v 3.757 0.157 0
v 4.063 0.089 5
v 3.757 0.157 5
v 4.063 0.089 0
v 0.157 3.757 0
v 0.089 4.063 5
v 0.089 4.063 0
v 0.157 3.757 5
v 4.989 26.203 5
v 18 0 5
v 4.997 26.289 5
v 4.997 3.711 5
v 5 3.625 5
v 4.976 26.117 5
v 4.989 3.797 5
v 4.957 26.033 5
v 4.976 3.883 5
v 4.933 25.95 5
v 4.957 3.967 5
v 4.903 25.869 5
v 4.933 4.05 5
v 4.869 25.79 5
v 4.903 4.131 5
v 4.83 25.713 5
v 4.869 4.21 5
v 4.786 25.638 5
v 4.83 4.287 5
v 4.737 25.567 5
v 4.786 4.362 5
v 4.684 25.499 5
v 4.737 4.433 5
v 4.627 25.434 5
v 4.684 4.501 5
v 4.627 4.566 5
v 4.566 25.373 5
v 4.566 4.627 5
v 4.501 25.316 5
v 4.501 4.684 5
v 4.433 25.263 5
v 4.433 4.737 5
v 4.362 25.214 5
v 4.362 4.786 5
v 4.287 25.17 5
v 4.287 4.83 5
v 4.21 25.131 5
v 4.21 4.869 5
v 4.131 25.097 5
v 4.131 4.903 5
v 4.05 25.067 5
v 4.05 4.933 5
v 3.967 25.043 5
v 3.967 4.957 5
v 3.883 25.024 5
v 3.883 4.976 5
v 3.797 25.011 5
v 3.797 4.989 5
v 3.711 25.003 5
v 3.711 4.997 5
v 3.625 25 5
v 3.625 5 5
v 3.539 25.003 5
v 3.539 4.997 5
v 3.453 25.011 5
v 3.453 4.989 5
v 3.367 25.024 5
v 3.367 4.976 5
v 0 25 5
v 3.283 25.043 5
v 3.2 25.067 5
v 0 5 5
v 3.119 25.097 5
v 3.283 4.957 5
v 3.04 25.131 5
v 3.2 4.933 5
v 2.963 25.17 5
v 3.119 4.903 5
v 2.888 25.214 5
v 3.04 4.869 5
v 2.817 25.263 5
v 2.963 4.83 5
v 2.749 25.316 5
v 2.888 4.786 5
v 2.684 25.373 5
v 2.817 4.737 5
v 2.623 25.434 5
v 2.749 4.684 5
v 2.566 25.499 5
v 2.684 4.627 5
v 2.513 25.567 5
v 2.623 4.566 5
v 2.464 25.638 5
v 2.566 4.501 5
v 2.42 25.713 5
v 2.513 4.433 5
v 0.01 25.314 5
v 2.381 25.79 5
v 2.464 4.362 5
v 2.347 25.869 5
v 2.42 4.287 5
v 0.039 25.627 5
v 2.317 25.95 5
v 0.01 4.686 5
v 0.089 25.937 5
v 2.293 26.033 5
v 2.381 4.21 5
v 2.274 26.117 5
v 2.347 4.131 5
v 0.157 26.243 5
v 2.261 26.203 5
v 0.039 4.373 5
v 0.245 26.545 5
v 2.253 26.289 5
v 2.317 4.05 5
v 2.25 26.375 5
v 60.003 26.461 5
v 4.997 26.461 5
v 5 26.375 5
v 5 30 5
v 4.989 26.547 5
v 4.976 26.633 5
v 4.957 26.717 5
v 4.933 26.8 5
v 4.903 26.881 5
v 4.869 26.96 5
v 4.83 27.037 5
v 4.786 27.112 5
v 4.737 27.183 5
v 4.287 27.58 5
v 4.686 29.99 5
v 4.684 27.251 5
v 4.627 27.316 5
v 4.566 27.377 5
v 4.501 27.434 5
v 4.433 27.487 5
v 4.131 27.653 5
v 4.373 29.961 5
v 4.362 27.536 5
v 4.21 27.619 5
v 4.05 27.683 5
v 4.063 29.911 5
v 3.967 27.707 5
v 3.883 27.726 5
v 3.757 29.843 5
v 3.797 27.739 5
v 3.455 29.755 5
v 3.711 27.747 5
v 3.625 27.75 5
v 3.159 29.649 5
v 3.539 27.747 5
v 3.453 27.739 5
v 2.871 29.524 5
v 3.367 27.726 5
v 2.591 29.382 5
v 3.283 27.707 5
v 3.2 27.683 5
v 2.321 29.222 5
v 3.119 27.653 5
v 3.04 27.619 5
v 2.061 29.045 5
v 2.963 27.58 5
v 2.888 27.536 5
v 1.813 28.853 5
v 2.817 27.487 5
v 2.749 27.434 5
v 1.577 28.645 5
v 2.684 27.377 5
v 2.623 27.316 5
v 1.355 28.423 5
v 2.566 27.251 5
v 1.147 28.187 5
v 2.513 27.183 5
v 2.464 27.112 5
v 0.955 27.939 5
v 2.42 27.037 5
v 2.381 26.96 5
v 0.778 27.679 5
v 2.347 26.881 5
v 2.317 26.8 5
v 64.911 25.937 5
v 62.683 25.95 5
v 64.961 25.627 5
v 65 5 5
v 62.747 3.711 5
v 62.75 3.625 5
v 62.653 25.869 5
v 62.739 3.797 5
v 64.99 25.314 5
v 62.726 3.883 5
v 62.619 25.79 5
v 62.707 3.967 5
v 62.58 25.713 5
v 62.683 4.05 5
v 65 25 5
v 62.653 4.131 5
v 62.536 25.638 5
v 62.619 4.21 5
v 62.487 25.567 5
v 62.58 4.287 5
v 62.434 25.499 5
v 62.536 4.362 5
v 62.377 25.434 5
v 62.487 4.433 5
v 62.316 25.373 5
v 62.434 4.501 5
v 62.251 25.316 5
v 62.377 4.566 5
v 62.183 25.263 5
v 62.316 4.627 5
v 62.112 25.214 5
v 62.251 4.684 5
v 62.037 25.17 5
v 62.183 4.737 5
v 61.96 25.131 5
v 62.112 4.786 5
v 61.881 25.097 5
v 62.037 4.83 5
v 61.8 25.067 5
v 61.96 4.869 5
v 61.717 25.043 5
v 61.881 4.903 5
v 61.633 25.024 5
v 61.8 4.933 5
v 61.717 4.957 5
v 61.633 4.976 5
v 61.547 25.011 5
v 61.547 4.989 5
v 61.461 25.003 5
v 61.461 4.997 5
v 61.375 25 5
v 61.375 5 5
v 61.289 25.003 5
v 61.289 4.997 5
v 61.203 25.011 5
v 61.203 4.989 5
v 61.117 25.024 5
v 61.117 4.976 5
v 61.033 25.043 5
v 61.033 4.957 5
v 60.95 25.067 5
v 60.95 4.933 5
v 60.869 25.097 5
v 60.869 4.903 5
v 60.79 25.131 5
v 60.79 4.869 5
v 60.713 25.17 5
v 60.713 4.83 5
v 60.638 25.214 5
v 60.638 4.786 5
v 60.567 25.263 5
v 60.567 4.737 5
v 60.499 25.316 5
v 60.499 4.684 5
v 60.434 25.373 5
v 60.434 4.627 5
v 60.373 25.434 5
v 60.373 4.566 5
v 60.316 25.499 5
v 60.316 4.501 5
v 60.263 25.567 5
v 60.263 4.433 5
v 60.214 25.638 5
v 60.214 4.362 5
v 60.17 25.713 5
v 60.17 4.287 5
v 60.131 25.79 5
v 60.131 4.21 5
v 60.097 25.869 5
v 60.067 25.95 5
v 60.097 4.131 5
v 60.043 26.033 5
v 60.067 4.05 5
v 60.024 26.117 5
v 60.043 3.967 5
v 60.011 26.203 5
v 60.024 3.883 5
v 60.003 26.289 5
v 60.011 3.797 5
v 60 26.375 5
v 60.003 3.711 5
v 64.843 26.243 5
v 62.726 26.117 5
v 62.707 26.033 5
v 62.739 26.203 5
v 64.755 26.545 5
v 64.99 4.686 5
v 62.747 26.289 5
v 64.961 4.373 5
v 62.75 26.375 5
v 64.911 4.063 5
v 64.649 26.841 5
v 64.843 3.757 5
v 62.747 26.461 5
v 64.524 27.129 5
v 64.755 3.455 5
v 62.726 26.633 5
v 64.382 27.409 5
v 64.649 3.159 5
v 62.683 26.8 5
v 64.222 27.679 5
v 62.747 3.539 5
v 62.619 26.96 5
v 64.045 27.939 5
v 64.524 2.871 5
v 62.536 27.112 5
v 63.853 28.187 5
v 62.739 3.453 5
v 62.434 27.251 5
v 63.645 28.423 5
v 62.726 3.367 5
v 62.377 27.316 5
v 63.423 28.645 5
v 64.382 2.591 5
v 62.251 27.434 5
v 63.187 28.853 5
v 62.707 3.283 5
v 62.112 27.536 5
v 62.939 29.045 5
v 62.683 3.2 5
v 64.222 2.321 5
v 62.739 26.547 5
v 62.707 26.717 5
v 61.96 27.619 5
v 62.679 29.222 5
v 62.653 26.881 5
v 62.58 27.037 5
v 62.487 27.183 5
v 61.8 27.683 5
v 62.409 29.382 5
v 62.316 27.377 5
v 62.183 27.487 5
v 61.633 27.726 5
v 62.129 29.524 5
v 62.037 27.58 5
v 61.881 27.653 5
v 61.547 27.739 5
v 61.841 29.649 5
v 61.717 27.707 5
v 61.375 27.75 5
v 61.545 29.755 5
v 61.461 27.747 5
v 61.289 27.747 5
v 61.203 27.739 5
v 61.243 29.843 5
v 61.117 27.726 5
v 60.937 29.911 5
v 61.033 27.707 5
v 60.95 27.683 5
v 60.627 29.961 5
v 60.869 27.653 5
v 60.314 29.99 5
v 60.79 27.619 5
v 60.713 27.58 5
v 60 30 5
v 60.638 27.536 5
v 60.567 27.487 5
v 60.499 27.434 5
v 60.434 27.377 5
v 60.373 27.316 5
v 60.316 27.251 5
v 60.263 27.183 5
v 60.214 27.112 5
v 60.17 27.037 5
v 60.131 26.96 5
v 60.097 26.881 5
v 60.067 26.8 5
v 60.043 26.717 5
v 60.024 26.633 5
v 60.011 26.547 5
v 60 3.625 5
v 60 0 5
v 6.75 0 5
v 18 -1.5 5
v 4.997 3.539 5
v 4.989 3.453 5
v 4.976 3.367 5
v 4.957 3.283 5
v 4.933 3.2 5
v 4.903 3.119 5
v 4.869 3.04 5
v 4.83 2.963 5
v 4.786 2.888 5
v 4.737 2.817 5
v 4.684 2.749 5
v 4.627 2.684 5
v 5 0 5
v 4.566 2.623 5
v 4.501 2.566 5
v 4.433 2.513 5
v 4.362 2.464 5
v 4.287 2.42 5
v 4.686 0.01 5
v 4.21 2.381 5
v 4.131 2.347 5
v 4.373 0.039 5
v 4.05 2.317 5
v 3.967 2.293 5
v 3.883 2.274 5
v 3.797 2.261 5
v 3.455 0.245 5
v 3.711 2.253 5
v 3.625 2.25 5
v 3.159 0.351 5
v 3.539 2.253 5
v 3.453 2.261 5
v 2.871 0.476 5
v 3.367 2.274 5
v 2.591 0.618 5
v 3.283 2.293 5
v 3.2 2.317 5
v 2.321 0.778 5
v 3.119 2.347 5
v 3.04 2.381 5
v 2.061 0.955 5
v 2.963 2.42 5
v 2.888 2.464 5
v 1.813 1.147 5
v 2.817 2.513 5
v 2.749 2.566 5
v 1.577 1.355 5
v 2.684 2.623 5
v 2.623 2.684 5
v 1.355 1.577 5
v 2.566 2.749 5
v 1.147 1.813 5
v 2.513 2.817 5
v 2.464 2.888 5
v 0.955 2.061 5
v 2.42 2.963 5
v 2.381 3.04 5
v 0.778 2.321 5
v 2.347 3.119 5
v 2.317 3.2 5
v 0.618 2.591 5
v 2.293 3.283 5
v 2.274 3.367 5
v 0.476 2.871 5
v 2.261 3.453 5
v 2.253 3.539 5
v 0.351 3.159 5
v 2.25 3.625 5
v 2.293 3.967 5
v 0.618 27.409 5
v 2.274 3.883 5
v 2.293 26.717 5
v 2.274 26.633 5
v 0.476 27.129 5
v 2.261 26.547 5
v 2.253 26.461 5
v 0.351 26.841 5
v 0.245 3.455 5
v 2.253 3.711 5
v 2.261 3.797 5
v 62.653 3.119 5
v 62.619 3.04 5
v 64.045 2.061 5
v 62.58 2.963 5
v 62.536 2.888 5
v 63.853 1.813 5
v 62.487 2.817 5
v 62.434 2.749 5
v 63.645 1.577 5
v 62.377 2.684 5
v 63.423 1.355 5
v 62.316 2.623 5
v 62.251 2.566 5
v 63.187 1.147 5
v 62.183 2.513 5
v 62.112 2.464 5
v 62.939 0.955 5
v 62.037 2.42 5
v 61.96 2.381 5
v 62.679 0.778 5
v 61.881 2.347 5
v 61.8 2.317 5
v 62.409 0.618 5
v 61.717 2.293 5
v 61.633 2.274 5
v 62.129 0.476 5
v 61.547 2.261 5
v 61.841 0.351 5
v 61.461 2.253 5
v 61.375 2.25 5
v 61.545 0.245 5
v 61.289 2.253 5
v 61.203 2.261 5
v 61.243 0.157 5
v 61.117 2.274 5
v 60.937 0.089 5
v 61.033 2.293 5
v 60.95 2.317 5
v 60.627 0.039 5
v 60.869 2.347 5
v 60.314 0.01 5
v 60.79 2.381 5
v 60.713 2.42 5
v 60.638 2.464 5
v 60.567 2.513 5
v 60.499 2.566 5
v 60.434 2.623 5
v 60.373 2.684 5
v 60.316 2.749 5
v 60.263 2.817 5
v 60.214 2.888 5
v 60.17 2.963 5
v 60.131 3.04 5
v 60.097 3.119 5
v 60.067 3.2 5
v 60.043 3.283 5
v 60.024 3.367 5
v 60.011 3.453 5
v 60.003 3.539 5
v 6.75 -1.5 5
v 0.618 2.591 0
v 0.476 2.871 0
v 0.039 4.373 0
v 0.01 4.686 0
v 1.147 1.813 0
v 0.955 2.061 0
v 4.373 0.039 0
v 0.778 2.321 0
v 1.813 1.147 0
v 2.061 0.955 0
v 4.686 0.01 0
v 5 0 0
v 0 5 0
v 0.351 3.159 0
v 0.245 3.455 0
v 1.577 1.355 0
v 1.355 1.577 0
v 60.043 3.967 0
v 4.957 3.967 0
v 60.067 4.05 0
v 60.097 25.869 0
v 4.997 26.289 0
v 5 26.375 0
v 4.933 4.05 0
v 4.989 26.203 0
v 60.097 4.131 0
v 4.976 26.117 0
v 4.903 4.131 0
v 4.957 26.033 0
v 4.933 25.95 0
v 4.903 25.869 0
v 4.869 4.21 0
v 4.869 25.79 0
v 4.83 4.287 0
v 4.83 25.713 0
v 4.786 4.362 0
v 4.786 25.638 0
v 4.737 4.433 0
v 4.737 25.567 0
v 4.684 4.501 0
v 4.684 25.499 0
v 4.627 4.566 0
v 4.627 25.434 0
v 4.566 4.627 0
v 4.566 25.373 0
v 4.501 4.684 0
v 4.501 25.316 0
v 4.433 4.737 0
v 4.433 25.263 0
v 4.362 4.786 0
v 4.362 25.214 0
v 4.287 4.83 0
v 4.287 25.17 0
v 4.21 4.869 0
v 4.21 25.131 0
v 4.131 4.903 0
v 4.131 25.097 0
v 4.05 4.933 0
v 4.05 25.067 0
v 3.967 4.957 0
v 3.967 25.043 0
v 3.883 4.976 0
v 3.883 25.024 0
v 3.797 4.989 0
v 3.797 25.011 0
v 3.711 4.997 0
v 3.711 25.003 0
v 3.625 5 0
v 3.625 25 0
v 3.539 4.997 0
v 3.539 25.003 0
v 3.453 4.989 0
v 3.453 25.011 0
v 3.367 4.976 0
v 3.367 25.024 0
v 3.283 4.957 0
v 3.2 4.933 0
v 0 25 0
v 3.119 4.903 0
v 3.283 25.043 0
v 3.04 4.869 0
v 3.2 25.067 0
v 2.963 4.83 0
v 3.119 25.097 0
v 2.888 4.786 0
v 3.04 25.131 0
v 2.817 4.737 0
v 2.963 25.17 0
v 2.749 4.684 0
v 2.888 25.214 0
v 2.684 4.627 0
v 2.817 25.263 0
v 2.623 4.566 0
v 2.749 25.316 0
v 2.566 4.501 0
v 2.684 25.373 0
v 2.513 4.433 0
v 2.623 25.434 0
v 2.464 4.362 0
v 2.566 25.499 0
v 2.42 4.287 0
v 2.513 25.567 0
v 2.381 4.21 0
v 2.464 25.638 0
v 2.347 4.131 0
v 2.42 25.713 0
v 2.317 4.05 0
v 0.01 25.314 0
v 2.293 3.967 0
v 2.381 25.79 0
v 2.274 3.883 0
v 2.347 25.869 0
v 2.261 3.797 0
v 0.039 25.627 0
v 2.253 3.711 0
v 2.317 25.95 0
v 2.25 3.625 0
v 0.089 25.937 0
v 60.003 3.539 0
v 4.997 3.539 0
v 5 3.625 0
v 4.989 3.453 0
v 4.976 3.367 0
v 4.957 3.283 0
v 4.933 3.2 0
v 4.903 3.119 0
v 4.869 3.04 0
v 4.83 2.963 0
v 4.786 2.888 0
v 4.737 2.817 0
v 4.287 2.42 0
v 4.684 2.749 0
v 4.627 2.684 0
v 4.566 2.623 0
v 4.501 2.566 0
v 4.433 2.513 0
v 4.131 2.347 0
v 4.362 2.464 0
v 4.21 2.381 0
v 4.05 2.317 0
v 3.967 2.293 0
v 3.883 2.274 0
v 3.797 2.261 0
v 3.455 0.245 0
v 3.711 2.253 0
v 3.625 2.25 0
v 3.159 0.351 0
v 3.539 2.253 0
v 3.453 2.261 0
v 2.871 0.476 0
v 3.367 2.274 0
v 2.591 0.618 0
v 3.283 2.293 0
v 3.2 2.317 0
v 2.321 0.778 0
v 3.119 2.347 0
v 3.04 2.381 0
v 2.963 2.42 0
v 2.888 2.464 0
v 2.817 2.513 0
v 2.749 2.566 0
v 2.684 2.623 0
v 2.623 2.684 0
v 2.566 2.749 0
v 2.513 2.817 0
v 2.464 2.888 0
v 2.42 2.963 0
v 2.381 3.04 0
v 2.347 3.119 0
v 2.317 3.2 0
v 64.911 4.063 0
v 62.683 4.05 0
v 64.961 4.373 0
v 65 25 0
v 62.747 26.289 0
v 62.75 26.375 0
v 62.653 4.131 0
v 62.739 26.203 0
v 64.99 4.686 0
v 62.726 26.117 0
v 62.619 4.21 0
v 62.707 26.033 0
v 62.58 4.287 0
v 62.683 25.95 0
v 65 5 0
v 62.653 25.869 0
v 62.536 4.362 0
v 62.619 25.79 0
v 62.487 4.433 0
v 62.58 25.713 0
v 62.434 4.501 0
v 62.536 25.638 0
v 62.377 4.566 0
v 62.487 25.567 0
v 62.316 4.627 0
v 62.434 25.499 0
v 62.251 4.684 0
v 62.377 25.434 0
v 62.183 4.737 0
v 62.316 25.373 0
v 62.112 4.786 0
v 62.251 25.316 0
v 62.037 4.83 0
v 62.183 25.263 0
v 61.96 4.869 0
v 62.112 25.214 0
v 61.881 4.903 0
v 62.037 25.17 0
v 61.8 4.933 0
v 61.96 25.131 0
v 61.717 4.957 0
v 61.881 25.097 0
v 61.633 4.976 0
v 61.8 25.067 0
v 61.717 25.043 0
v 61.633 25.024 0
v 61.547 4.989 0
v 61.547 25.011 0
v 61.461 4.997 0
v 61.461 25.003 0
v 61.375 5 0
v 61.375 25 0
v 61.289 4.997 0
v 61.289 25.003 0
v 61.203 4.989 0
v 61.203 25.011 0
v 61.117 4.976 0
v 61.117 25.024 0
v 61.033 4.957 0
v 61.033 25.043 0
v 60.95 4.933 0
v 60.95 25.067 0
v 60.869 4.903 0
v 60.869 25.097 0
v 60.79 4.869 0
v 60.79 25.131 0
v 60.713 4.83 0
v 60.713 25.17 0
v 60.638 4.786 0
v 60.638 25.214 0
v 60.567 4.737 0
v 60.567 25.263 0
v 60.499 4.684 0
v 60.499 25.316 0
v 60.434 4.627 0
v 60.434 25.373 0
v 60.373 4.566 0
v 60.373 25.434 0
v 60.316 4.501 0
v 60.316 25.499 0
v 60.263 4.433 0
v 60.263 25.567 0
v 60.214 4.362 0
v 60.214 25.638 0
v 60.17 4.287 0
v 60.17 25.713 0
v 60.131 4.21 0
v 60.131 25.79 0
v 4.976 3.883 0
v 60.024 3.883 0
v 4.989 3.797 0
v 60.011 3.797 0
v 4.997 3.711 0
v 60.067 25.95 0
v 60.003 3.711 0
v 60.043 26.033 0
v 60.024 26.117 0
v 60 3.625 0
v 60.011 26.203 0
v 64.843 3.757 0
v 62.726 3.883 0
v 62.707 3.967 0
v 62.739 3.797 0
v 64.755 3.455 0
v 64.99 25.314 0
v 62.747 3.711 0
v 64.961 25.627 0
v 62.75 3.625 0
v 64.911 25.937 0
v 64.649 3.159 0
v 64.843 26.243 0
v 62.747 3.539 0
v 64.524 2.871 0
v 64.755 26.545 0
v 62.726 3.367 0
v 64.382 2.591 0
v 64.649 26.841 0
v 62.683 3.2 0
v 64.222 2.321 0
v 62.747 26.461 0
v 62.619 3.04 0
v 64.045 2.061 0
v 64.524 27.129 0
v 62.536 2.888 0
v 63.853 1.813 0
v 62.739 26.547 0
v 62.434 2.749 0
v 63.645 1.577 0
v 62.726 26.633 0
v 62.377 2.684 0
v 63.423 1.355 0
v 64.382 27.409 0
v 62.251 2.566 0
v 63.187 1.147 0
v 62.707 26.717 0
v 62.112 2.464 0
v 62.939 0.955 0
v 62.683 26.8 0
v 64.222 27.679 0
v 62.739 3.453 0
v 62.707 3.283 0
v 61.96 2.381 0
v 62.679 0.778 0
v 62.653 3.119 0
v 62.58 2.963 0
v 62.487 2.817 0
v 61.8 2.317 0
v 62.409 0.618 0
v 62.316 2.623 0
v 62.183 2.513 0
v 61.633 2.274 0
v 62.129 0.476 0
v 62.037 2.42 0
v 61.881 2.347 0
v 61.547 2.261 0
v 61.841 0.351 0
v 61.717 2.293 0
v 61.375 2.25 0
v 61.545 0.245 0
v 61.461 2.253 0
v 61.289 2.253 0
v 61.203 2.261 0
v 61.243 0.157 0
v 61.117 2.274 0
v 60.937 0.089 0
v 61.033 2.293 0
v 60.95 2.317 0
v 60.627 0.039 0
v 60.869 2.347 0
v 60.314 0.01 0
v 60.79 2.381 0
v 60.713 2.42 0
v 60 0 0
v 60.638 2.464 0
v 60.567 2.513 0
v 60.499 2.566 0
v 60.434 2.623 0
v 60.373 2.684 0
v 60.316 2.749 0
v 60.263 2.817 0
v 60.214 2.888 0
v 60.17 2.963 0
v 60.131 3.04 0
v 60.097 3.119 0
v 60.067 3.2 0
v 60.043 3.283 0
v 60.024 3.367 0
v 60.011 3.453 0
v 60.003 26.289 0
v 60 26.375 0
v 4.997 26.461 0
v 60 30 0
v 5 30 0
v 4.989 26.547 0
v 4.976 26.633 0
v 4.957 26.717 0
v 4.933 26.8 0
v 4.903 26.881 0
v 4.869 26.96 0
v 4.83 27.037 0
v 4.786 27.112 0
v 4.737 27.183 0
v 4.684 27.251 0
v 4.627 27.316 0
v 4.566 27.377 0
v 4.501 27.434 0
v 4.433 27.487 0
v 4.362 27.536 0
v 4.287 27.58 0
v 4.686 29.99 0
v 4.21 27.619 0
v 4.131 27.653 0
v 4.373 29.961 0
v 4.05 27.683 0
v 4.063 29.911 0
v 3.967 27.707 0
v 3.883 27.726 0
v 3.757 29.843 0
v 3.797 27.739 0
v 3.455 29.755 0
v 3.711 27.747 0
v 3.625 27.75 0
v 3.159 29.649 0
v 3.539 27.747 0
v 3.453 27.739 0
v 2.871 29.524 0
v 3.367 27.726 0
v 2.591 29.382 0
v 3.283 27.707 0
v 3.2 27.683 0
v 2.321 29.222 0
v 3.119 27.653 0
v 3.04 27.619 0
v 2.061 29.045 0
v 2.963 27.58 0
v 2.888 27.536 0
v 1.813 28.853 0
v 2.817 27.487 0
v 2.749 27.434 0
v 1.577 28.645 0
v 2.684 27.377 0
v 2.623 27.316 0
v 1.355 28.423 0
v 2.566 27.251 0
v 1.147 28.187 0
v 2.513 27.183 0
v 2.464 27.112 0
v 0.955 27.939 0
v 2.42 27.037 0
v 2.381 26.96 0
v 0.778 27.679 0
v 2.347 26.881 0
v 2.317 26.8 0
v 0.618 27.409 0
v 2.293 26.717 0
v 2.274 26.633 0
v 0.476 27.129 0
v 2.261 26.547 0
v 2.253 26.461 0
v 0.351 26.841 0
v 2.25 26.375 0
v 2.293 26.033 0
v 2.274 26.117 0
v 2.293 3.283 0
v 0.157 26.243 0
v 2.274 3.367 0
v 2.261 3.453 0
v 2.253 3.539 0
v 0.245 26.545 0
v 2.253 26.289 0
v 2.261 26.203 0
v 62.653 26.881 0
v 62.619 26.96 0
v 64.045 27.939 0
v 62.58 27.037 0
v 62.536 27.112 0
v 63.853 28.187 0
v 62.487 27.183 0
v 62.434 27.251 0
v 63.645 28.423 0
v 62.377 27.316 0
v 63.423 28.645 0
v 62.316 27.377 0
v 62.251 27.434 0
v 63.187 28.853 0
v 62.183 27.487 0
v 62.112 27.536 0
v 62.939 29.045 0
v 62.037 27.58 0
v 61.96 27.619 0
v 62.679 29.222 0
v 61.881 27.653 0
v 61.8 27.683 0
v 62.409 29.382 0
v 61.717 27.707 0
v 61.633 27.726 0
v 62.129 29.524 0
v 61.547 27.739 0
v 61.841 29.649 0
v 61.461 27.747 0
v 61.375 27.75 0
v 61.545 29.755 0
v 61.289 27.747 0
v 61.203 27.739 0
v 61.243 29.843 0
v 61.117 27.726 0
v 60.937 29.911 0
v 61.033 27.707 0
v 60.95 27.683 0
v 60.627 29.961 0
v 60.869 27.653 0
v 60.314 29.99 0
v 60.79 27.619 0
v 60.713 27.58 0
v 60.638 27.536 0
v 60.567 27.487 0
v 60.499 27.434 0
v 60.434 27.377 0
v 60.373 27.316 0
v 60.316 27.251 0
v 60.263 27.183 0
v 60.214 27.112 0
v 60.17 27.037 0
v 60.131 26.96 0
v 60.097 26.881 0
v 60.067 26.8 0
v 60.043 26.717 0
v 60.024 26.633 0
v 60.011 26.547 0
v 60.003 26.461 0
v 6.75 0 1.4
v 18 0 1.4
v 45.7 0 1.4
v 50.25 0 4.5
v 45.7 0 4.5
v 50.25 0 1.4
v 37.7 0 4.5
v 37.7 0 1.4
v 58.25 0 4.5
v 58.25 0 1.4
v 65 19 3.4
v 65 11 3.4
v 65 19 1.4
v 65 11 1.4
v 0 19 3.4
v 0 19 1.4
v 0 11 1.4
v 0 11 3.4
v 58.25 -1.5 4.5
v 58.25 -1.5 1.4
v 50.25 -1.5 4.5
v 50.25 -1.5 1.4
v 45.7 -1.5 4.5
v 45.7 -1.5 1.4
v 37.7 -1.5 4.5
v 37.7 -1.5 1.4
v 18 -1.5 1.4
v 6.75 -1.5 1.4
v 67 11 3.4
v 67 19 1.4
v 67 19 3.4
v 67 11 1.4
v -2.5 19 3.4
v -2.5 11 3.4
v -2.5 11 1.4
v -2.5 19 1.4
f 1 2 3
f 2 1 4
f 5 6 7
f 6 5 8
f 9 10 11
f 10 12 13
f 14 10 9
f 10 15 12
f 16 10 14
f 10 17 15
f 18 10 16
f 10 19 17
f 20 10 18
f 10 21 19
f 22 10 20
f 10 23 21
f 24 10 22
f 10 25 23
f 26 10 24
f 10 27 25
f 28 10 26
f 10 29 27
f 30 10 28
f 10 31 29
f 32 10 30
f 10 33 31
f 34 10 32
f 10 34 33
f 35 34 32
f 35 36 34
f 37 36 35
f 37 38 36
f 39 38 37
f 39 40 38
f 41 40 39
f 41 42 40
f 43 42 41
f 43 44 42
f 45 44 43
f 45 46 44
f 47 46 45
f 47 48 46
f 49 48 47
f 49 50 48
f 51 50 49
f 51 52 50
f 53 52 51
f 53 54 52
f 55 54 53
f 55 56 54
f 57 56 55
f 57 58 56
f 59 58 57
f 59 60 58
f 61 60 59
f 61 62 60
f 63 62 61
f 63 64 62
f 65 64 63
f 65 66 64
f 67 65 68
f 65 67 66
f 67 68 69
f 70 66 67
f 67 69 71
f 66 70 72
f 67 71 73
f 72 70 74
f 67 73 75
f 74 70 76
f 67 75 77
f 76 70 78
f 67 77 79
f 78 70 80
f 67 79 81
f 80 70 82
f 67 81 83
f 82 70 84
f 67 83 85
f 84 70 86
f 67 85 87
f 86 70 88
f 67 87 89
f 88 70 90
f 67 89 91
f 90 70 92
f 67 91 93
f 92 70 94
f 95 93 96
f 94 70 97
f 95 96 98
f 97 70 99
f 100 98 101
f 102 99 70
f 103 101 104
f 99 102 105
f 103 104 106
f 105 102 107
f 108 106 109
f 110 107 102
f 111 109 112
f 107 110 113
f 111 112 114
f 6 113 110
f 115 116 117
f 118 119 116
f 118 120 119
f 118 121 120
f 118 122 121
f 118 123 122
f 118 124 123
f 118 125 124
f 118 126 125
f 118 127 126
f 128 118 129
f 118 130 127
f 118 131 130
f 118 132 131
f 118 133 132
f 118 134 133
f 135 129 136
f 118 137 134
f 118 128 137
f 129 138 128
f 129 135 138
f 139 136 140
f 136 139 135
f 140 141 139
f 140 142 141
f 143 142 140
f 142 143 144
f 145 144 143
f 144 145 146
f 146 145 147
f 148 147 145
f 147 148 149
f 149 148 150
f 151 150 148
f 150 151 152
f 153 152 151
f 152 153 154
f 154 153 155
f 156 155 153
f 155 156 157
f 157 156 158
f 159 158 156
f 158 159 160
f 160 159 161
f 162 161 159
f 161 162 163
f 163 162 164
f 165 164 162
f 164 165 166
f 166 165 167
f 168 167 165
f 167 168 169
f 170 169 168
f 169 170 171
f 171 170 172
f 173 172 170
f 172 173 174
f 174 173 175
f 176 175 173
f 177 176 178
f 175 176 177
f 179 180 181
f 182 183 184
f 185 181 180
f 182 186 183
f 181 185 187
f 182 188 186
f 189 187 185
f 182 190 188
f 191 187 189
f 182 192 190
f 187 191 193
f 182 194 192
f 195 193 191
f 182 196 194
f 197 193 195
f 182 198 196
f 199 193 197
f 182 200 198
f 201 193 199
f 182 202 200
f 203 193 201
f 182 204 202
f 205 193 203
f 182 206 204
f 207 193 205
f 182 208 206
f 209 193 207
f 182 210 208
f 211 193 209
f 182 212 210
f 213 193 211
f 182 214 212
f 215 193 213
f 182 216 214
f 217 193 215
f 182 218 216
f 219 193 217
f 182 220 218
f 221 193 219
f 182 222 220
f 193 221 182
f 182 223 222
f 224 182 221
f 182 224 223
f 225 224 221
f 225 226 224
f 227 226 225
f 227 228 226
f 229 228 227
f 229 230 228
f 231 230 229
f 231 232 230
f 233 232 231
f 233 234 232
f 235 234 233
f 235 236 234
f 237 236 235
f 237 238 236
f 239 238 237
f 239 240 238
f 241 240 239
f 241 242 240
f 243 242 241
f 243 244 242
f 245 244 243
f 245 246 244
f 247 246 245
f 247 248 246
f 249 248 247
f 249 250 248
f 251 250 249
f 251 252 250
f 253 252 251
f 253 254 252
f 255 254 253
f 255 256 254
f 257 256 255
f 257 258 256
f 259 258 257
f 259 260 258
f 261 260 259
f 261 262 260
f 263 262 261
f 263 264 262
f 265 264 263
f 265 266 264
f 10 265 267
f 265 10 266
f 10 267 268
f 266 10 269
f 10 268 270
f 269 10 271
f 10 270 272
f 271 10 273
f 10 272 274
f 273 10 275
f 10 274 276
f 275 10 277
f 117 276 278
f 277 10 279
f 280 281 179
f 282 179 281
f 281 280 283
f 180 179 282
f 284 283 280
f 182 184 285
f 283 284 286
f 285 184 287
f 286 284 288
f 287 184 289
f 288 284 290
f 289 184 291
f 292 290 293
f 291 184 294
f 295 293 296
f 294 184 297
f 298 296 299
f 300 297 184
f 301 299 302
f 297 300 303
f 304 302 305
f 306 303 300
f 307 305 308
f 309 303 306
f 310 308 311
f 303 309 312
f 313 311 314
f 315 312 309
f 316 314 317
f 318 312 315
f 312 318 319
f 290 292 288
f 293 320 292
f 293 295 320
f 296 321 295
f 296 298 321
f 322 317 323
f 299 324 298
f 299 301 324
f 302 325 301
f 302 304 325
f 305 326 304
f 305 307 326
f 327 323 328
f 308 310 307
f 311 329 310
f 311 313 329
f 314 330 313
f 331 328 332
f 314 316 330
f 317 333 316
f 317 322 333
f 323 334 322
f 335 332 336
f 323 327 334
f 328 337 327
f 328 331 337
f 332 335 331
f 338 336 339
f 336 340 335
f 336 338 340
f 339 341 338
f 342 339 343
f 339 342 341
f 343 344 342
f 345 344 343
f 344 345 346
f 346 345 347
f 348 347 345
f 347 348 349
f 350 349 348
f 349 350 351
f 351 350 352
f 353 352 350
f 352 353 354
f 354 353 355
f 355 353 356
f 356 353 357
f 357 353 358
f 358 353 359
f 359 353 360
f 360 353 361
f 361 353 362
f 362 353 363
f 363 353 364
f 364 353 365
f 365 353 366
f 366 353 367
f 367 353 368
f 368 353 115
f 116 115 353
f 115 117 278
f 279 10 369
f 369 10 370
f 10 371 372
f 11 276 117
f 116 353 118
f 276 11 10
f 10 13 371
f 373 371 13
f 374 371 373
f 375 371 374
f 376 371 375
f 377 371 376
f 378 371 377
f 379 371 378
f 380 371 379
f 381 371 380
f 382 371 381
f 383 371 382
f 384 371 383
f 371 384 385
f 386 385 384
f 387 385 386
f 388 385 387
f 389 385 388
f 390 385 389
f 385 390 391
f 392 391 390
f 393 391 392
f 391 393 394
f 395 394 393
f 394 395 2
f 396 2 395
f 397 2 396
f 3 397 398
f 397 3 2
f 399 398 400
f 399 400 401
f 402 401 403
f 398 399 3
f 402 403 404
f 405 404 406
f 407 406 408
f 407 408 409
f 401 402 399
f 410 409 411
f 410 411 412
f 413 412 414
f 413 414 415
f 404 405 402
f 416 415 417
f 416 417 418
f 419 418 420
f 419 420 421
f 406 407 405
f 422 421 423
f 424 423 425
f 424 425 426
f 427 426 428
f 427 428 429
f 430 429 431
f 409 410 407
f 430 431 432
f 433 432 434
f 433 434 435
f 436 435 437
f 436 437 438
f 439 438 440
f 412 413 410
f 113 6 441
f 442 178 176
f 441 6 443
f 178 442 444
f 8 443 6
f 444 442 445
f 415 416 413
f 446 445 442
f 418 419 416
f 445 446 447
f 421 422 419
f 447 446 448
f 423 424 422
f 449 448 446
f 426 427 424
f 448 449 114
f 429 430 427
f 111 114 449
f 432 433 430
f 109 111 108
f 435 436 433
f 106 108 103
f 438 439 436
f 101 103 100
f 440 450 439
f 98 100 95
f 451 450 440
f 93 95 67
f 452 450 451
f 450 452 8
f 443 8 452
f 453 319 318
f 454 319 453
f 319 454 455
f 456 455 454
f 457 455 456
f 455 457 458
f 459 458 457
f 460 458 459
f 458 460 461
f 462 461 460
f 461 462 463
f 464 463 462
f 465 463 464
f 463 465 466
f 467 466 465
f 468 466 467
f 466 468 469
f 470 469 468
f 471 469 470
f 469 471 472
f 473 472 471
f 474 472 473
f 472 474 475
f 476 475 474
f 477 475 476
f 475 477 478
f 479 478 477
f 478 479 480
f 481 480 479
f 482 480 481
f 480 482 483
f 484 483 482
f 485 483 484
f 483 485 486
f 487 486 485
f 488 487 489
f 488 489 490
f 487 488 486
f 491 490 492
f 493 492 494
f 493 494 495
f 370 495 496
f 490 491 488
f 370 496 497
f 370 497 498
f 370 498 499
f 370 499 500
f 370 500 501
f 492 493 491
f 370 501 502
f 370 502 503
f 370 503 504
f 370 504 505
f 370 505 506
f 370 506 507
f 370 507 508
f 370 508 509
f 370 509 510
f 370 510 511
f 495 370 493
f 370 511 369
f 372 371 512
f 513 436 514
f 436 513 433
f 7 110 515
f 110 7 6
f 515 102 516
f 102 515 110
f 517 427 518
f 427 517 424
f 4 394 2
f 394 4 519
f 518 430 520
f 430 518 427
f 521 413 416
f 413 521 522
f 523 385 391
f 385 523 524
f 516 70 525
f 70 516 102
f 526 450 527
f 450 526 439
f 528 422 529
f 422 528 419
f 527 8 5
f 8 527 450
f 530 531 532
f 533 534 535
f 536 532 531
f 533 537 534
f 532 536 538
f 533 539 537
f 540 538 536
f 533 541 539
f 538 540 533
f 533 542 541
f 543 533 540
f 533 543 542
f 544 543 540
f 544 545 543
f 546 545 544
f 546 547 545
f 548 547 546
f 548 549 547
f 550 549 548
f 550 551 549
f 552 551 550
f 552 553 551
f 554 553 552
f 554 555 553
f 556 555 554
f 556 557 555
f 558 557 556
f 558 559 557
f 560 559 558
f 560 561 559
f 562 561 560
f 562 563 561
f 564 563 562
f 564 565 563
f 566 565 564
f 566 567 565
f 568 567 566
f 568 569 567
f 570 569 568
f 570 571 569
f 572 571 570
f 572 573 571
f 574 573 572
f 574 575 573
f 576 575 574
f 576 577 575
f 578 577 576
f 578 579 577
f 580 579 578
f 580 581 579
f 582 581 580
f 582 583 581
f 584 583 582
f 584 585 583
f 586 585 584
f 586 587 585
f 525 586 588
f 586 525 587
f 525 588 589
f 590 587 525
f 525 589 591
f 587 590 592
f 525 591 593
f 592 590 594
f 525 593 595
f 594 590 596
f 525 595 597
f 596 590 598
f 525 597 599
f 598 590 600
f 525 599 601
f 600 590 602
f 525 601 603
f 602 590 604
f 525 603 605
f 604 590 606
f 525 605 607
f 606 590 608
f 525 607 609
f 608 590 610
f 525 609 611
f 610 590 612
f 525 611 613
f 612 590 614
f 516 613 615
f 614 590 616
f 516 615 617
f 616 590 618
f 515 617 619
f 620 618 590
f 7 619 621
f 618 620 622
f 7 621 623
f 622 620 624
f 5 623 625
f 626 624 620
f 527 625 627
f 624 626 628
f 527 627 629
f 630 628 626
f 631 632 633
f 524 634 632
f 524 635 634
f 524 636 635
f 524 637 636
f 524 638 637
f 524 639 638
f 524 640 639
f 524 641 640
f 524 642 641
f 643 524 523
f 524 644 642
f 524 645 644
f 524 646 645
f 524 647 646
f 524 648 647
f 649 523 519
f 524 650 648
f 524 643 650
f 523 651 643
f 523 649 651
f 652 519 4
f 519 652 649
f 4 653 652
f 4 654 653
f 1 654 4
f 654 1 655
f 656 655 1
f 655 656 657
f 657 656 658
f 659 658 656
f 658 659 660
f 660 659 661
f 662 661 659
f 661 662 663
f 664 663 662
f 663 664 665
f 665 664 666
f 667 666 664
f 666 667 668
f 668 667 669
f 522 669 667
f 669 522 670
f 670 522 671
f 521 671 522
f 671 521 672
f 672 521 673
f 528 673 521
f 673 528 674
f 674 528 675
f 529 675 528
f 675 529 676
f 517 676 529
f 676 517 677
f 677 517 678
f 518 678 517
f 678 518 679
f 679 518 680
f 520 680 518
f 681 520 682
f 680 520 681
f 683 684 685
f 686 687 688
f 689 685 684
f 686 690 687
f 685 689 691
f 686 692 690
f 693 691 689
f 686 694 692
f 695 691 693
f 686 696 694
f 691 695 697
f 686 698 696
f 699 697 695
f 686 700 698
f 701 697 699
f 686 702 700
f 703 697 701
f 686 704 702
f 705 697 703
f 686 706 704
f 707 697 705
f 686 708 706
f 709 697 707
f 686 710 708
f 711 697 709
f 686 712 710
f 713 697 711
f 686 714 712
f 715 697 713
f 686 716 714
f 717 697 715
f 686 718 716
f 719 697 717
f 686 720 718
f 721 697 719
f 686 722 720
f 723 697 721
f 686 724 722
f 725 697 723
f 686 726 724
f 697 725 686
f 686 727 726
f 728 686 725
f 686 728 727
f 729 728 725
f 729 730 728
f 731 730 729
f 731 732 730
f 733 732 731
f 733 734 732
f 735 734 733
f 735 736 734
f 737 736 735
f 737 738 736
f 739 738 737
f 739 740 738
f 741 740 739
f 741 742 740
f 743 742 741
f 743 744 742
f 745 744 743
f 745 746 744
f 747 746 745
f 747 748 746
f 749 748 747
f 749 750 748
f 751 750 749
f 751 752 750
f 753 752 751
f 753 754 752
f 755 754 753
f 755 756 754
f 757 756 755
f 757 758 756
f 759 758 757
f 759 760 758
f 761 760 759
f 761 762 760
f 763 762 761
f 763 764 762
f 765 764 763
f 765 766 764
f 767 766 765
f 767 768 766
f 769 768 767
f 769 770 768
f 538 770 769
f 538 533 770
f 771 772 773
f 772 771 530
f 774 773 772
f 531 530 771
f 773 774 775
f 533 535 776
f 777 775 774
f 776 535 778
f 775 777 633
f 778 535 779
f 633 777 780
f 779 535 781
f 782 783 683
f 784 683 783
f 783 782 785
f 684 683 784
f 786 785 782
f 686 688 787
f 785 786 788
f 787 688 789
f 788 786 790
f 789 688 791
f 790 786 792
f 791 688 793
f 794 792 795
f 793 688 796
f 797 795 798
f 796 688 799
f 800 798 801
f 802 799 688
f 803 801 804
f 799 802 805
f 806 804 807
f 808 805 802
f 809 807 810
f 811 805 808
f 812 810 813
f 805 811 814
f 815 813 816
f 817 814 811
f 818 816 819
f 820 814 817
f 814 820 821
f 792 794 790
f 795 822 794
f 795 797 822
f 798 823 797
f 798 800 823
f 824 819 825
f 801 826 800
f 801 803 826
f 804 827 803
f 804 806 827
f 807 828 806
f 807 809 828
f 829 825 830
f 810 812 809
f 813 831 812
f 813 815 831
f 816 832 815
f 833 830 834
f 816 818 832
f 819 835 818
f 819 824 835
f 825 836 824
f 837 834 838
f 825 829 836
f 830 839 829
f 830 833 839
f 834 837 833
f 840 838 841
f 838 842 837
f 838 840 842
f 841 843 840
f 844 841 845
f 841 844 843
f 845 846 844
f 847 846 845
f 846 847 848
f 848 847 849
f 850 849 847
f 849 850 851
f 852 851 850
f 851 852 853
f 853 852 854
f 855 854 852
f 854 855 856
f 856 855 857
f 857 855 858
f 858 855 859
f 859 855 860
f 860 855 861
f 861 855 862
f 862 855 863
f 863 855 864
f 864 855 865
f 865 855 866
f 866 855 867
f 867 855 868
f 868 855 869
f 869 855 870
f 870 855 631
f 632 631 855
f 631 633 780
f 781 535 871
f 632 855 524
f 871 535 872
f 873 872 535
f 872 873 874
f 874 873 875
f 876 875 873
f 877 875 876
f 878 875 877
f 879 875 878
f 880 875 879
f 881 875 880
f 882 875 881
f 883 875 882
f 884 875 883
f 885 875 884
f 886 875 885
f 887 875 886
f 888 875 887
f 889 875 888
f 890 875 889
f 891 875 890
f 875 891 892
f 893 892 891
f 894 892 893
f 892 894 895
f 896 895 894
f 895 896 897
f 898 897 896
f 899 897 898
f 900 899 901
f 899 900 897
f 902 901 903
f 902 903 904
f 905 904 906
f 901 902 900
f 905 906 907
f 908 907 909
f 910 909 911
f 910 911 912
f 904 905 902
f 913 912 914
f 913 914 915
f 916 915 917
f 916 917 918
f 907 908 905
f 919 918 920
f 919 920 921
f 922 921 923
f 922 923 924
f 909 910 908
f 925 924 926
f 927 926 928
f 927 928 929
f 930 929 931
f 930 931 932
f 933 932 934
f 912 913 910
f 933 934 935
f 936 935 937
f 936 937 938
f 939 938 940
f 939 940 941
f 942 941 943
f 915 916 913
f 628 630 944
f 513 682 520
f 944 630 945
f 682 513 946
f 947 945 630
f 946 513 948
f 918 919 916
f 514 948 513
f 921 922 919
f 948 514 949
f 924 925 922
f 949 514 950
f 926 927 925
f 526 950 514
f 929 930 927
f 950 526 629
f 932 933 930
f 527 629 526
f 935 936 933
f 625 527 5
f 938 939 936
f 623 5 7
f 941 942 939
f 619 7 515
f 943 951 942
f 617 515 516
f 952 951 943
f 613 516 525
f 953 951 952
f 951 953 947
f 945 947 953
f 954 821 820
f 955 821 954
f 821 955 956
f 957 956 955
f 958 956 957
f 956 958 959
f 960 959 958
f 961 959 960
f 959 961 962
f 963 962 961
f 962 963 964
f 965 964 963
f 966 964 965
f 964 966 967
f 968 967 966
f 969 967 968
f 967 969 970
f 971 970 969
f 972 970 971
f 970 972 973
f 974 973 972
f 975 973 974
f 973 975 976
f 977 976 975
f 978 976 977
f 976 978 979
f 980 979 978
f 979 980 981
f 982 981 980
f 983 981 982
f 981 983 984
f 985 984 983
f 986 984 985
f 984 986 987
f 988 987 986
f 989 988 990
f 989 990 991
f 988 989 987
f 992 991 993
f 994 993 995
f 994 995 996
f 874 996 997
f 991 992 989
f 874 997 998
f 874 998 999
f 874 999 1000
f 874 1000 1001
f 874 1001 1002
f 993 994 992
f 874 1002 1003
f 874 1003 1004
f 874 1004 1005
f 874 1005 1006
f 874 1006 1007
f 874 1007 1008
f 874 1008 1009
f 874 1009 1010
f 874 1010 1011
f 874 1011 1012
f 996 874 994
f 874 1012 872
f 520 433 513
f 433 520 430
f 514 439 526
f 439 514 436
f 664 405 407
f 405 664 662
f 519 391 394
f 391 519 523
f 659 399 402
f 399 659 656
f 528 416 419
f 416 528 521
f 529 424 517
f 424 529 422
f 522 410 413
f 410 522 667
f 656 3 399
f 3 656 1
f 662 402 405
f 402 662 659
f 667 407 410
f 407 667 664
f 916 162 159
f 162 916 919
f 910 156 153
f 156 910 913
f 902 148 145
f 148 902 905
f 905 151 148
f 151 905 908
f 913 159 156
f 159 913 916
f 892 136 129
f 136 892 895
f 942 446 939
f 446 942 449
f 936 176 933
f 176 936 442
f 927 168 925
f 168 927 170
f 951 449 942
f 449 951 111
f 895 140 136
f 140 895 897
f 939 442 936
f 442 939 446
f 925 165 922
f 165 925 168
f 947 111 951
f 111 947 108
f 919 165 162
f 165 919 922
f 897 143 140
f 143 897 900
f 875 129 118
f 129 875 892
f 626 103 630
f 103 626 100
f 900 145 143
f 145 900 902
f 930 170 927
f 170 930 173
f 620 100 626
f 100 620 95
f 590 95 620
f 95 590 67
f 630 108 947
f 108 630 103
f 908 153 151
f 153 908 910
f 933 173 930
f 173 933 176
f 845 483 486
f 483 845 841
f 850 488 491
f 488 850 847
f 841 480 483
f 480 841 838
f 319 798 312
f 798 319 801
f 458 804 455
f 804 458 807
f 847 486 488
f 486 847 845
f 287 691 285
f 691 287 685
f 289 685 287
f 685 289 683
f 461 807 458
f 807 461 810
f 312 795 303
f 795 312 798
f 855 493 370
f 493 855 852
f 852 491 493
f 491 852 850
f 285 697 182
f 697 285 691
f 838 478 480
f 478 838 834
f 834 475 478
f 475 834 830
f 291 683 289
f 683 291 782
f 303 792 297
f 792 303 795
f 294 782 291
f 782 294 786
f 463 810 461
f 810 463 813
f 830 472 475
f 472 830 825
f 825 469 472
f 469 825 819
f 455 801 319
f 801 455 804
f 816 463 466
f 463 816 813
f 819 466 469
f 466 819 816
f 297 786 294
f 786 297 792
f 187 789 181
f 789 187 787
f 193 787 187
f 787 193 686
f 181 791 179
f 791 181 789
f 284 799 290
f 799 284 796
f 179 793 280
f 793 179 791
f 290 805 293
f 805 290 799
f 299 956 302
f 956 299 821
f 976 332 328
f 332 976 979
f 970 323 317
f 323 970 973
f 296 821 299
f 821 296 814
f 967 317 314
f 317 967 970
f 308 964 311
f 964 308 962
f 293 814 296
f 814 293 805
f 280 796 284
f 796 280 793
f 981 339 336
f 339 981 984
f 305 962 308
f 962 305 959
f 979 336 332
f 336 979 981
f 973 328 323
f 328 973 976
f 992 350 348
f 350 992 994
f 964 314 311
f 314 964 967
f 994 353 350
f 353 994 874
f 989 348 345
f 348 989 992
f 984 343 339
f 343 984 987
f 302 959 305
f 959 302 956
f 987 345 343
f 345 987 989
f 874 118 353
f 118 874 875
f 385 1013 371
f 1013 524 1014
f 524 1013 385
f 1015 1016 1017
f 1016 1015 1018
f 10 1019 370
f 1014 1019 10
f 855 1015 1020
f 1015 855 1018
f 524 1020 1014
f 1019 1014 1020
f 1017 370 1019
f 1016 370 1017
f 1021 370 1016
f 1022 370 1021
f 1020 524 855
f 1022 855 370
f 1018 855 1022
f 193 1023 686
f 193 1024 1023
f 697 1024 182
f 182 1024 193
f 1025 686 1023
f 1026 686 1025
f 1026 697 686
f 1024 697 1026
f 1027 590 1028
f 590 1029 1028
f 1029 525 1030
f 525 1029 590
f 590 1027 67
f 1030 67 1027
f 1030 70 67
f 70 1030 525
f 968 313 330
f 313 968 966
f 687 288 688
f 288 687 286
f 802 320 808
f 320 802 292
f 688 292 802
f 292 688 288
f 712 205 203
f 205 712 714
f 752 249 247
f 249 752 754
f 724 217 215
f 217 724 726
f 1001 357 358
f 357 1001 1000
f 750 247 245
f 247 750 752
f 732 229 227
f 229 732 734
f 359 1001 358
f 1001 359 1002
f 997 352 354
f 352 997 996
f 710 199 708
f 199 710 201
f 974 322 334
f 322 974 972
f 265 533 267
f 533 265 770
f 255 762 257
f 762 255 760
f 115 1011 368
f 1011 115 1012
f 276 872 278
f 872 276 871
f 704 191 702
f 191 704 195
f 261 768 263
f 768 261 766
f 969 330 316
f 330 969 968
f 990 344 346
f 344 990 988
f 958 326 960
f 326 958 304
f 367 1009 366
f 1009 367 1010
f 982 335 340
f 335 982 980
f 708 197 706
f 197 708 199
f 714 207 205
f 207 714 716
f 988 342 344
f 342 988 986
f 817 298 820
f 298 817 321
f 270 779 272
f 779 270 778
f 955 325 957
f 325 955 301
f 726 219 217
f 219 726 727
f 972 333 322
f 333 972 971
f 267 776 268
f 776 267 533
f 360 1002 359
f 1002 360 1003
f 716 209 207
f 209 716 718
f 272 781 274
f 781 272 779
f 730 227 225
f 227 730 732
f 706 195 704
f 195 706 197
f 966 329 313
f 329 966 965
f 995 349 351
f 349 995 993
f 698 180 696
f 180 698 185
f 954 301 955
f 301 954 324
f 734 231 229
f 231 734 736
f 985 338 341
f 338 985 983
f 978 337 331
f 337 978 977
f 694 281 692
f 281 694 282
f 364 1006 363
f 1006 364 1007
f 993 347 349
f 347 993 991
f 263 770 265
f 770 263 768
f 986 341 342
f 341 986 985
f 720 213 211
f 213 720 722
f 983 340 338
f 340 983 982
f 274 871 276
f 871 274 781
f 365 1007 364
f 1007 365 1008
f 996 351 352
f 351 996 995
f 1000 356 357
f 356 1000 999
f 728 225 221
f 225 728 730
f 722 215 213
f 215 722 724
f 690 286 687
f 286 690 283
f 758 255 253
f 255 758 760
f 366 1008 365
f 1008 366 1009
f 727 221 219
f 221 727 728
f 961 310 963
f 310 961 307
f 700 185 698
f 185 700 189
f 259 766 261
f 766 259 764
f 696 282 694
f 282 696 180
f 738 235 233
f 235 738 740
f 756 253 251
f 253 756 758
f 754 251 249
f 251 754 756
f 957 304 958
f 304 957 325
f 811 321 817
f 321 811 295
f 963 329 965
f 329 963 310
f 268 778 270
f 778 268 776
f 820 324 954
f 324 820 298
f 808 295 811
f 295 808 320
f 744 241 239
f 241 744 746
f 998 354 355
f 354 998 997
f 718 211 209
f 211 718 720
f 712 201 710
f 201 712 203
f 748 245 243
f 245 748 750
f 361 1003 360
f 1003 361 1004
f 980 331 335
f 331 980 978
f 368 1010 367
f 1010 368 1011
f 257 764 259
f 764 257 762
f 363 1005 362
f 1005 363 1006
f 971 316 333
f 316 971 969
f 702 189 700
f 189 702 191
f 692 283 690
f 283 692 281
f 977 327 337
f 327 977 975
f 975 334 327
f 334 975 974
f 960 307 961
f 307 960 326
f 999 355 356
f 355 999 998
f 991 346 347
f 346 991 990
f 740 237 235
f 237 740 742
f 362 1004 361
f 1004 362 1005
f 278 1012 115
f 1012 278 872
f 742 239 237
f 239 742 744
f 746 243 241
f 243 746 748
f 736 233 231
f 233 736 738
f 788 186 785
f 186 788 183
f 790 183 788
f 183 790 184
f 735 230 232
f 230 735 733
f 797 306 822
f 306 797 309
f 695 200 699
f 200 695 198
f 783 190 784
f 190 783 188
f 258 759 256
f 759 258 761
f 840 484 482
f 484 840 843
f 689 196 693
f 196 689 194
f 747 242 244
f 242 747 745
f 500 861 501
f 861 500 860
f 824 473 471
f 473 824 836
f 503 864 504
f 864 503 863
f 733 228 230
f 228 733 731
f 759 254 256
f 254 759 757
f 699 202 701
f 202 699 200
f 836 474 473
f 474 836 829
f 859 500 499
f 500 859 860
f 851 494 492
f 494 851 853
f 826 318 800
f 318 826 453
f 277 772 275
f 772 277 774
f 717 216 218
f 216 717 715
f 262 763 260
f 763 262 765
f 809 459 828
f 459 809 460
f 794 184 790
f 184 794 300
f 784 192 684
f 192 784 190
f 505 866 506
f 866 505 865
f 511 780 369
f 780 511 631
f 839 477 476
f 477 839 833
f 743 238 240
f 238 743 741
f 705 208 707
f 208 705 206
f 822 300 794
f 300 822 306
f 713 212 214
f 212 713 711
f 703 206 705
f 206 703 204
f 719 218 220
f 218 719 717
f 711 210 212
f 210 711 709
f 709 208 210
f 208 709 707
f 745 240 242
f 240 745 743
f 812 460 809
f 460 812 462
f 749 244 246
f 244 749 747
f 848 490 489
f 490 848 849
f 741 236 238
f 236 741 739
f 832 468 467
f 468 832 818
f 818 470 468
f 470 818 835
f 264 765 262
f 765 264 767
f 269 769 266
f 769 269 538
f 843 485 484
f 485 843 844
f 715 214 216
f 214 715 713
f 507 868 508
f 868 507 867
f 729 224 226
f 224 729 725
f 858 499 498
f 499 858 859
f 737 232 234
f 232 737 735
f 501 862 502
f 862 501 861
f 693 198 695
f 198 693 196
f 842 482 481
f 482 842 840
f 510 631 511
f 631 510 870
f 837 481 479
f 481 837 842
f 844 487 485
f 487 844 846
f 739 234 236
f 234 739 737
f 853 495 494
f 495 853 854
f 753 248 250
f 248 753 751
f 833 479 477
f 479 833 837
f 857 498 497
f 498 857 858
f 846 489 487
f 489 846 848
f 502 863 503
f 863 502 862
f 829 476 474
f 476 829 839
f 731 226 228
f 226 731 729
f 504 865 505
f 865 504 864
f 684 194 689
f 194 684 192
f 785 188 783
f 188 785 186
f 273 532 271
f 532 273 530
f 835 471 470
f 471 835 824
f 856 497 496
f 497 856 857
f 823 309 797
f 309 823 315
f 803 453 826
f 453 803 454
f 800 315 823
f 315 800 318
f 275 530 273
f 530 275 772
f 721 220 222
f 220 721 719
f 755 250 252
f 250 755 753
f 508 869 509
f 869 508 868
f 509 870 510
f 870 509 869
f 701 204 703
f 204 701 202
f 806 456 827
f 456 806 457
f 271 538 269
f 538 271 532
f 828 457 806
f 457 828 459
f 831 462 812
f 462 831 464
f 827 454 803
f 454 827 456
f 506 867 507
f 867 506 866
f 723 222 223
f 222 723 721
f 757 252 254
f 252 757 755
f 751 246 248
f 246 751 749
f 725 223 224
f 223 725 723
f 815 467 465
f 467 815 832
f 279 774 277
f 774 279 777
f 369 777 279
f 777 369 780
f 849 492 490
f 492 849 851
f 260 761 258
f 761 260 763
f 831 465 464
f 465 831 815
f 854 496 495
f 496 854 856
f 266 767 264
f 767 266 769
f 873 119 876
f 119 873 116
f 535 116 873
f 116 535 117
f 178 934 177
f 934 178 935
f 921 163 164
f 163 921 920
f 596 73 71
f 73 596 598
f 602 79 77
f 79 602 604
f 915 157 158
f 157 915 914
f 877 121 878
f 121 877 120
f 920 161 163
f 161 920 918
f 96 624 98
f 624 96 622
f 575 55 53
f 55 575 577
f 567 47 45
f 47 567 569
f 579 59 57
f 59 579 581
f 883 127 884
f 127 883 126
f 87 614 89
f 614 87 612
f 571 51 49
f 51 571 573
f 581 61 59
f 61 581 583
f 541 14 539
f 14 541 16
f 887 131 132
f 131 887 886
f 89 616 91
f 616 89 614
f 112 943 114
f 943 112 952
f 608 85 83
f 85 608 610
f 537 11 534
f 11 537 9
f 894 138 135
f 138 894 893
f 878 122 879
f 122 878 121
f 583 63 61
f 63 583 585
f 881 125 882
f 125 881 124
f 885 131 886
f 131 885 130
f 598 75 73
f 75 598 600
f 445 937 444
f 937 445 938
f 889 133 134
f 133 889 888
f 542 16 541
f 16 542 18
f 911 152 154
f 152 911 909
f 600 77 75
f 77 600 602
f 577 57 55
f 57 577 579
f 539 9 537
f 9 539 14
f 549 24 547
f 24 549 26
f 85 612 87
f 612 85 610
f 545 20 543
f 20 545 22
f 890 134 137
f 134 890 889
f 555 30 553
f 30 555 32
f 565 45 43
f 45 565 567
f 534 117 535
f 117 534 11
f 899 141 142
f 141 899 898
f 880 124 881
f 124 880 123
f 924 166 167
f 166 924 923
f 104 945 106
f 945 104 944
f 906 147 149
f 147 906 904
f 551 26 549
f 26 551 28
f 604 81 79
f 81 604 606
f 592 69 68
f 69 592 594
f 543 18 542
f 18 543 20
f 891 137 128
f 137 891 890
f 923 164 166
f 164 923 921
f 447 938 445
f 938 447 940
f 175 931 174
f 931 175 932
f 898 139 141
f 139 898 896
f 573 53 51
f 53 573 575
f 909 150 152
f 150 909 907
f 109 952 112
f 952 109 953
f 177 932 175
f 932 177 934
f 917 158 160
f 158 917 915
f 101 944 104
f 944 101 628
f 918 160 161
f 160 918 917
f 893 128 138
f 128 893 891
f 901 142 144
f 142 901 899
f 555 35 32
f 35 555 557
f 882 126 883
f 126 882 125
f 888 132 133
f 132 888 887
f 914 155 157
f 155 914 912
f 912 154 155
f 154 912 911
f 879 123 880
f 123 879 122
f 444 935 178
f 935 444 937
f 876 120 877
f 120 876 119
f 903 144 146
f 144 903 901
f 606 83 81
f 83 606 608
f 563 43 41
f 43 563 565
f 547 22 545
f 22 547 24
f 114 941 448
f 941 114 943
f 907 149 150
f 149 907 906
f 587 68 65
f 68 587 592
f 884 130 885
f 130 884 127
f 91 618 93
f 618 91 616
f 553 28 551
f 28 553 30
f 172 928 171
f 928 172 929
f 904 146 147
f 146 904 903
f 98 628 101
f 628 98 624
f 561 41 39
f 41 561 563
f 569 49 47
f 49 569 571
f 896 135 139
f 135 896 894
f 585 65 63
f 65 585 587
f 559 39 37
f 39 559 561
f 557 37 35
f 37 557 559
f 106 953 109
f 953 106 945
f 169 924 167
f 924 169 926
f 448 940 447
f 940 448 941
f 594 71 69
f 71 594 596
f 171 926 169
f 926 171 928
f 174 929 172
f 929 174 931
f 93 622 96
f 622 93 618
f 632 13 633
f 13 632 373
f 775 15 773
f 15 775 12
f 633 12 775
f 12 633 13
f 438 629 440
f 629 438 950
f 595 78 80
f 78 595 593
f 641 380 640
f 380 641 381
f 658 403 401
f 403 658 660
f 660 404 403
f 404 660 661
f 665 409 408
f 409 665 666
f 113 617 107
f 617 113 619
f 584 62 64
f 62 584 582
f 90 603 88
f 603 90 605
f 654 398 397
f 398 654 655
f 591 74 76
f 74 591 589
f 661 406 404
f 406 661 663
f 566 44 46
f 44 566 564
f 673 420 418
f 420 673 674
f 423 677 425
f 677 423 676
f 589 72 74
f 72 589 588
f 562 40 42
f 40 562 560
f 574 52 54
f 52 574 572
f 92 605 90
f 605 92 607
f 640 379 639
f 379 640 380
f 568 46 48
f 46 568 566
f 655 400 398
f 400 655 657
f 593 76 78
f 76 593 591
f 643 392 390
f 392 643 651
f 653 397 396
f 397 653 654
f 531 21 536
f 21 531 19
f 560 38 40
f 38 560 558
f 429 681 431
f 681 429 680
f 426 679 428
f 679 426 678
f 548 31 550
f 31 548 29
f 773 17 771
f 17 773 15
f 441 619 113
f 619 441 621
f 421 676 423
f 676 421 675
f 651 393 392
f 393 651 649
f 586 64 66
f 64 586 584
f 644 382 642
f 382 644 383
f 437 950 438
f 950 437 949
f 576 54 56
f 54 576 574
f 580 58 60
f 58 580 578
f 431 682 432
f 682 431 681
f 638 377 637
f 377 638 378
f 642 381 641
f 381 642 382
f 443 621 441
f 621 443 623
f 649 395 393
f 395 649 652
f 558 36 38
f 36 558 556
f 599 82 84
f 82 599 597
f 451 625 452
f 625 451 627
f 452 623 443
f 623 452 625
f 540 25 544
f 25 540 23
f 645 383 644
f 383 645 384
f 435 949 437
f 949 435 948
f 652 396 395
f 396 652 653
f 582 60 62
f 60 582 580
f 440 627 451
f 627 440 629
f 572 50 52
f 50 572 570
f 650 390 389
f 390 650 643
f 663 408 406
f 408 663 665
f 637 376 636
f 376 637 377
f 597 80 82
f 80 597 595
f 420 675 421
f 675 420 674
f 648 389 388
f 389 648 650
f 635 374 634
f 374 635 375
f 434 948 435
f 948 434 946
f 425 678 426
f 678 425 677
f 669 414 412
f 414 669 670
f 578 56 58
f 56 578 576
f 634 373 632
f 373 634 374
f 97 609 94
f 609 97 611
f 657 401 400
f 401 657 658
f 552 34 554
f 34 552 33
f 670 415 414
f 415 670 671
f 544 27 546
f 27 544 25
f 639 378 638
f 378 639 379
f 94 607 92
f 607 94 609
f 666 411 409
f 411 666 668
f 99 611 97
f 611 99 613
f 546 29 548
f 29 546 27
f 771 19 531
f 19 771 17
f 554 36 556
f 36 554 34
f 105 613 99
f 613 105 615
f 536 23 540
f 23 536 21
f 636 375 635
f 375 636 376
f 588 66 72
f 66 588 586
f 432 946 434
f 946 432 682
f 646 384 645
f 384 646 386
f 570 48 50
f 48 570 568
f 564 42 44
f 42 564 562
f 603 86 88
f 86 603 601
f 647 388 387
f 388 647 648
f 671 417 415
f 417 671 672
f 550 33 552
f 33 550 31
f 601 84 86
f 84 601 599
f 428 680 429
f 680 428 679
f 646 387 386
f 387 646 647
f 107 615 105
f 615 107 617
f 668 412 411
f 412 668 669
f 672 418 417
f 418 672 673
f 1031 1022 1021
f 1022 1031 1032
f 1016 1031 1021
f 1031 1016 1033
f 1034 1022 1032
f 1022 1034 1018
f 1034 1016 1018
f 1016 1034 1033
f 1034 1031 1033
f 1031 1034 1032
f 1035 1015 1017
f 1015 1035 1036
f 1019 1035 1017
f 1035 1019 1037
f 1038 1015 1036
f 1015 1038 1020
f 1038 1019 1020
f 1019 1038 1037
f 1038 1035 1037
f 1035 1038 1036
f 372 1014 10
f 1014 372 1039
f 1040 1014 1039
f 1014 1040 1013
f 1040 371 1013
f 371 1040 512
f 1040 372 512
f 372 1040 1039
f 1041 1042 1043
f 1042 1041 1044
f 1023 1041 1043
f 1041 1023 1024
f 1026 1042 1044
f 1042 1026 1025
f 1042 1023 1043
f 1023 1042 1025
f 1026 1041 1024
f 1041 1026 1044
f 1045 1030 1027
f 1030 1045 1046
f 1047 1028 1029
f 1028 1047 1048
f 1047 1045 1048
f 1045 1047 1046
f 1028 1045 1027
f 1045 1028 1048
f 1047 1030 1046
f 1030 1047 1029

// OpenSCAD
use <MCAD/boxes.scad>

pi_x=65;
pi_x_pad=4.5;
pi_y=30;
pi_y_pad=1.5;
pi_z=5;
pi_z_pad=2.25;
pi_board_z=1.4;

pi_screw_r=2.75/2;
pi_screw_inset=2.25;

pi_usb_overhang=1.5;
pi_usb_x=8;
pi_usb_y=8;
pi_usb_z=3.1;

pi_hdmi_overhang=1.5;
pi_hdmi_x=11.25;
pi_hdmi_y=8;
pi_hdmi_z=3.6;

pi_cam_overhang=2;
pi_cam_x=12;
pi_cam_y=8;
pi_cam_z=2;

pi_sd_overhang=2.5; 
pi_sd_x=12;
pi_sd_y=8;
pi_sd_z=2;

union(){
    //color("green") cube([pi_x,pi_y,pi_z]);
    /*
     *  PCB Base
     */
    translate([pi_x/2,pi_y/2,pi_z/2]){
        difference(){
            roundedBox([pi_x, pi_y, pi_z], 5, true, $fn=100); 
           
            translate([(pi_x/2)-pi_screw_inset-pi_screw_r,
                        (pi_y/2)-pi_screw_inset-pi_screw_r,
                        -(pi_z/2)-.25]){
                color("cyan")
                cylinder (h=pi_z+.5, r=pi_screw_r,$fn=100);
            }
            
            translate([(pi_x/2)-pi_screw_inset-pi_screw_r,
                       -(pi_y/2)+pi_screw_inset+pi_screw_r,
                       -(pi_z/2)-.25]){
                color("cyan")
                cylinder (h=pi_z+.5, r=pi_screw_r,$fn=100);
            }
            
            translate([(-pi_x/2)+pi_screw_inset+pi_screw_r,
                        (pi_y/2)-pi_screw_inset-pi_screw_r,
                        -(pi_z/2)-.25]){
                color("cyan")
                cylinder (h=2*pi_z+.5, r=pi_screw_r,$fn=100);
            }
        
            translate([(-pi_x/2)+pi_screw_inset+pi_screw_r,
                        -(pi_y/2)+pi_screw_inset+pi_screw_r,
                        -(pi_z/2)-.25]){
                color("cyan")
                cylinder (h=2*pi_z+.5, r=pi_screw_r,$fn=100);
            }
        }
    }


    /*
     *      PORTS
     */
    translate([pi_x-6.75-pi_usb_x,-pi_usb_overhang,pi_board_z]){
        color("red")
        //USB Port 1
        cube([pi_usb_x,pi_usb_y,pi_usb_z]);
        translate([-pi_usb_x-4.55,0,0]){
            color("red")
            //USB Port 2
            cube([pi_usb_x,pi_usb_y,pi_usb_z]);
        }
    }

    translate([6.75,-pi_hdmi_overhang,pi_board_z]){
        color("green")
        //HDMI Port
        cube([pi_hdmi_x,pi_hdmi_y,pi_hdmi_z]);
    }
    
    translate([pi_x+pi_cam_overhang-pi_cam_x,(pi_y-pi_cam_y)/2,pi_board_z]){
        color("blue")
        //Camera Port
        cube([pi_cam_x,pi_cam_y,pi_cam_z]);
    }
    
    translate([-pi_sd_overhang,(pi_y-pi_sd_y)/2,pi_board_z]){
        color("purple")
        //MicroSD Port
        cube([pi_sd_x,pi_sd_y,pi_sd_z]);
    }
}
